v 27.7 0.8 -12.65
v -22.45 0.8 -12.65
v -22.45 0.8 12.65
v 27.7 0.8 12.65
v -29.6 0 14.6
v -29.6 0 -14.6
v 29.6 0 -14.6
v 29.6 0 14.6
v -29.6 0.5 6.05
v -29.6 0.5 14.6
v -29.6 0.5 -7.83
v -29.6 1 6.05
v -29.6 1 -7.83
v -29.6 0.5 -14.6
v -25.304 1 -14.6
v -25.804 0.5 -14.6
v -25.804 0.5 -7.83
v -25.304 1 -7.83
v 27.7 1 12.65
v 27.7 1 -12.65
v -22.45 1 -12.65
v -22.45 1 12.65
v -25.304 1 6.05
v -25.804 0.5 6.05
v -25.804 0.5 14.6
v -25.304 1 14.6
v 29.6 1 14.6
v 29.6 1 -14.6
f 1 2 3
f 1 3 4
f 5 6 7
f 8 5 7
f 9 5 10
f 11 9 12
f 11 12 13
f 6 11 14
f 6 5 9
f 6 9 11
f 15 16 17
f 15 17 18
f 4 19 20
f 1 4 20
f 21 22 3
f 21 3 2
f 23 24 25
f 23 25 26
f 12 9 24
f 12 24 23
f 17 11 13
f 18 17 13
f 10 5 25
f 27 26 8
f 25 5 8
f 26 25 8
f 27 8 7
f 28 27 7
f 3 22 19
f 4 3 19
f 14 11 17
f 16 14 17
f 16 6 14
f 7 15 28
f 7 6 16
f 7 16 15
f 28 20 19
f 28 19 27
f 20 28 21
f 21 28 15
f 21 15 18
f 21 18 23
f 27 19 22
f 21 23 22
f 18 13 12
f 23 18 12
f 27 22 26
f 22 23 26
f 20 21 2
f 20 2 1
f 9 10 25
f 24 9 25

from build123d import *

# Parameters (mm, degrees)
SKETCH1_W           = 59.2
SKETCH1_H           = 29.2
BOSS_EXTRUDE1_DEPTH = 1
SKETCH2_W           = 50.15
SKETCH2_H           = 25.3
CUT_EXTRUDE1_DEPTH  = 0.2
CUT_EXTRUDE2_DEPTH  = 42.590864381
SKETCH4_W           = 13.88
SKETCH4_H           = 0.707068884
BOSS_EXTRUDE2_DEPTH = 4.5


with BuildPart() as part:
    # Sketch1 → Boss-Extrude1 (new body)
    with BuildSketch(Plane(origin=(0, 0, 0), x_dir=(1, 0, 0), z_dir=(0, 1, 0))):
        Rectangle(SKETCH1_W, SKETCH1_H)
    extrude(amount=BOSS_EXTRUDE1_DEPTH)

    # Sketch2 → Cut-Extrude1 (cut)
    with BuildSketch(Plane(origin=(0, 1, 0), x_dir=(1, 0, 0), z_dir=(0, 1, 0))):
        with Locations((2.625, 0)):
            Rectangle(SKETCH2_W, SKETCH2_H)
    extrude(amount=-CUT_EXTRUDE1_DEPTH, mode=Mode.SUBTRACT)

    # Sketch3 → Cut-Extrude2 (cut, through all)
    with BuildSketch(Plane.XY.offset(14.6)):
        Polygon((-29.6, 0.5), (-25.80413761, 0.5), (-25.30413761, 1), (-29.6, 1), align=None)
    extrude(amount=-CUT_EXTRUDE2_DEPTH, mode=Mode.SUBTRACT)

    # Sketch4 → Boss-Extrude2 (add)
    with BuildSketch(Plane.ZY.offset(29.6)):
        with Locations((-0.89, 0.646465558)):
            Rectangle(SKETCH4_W, SKETCH4_H)
    extrude(amount=-BOSS_EXTRUDE2_DEPTH)


solid = part.part
